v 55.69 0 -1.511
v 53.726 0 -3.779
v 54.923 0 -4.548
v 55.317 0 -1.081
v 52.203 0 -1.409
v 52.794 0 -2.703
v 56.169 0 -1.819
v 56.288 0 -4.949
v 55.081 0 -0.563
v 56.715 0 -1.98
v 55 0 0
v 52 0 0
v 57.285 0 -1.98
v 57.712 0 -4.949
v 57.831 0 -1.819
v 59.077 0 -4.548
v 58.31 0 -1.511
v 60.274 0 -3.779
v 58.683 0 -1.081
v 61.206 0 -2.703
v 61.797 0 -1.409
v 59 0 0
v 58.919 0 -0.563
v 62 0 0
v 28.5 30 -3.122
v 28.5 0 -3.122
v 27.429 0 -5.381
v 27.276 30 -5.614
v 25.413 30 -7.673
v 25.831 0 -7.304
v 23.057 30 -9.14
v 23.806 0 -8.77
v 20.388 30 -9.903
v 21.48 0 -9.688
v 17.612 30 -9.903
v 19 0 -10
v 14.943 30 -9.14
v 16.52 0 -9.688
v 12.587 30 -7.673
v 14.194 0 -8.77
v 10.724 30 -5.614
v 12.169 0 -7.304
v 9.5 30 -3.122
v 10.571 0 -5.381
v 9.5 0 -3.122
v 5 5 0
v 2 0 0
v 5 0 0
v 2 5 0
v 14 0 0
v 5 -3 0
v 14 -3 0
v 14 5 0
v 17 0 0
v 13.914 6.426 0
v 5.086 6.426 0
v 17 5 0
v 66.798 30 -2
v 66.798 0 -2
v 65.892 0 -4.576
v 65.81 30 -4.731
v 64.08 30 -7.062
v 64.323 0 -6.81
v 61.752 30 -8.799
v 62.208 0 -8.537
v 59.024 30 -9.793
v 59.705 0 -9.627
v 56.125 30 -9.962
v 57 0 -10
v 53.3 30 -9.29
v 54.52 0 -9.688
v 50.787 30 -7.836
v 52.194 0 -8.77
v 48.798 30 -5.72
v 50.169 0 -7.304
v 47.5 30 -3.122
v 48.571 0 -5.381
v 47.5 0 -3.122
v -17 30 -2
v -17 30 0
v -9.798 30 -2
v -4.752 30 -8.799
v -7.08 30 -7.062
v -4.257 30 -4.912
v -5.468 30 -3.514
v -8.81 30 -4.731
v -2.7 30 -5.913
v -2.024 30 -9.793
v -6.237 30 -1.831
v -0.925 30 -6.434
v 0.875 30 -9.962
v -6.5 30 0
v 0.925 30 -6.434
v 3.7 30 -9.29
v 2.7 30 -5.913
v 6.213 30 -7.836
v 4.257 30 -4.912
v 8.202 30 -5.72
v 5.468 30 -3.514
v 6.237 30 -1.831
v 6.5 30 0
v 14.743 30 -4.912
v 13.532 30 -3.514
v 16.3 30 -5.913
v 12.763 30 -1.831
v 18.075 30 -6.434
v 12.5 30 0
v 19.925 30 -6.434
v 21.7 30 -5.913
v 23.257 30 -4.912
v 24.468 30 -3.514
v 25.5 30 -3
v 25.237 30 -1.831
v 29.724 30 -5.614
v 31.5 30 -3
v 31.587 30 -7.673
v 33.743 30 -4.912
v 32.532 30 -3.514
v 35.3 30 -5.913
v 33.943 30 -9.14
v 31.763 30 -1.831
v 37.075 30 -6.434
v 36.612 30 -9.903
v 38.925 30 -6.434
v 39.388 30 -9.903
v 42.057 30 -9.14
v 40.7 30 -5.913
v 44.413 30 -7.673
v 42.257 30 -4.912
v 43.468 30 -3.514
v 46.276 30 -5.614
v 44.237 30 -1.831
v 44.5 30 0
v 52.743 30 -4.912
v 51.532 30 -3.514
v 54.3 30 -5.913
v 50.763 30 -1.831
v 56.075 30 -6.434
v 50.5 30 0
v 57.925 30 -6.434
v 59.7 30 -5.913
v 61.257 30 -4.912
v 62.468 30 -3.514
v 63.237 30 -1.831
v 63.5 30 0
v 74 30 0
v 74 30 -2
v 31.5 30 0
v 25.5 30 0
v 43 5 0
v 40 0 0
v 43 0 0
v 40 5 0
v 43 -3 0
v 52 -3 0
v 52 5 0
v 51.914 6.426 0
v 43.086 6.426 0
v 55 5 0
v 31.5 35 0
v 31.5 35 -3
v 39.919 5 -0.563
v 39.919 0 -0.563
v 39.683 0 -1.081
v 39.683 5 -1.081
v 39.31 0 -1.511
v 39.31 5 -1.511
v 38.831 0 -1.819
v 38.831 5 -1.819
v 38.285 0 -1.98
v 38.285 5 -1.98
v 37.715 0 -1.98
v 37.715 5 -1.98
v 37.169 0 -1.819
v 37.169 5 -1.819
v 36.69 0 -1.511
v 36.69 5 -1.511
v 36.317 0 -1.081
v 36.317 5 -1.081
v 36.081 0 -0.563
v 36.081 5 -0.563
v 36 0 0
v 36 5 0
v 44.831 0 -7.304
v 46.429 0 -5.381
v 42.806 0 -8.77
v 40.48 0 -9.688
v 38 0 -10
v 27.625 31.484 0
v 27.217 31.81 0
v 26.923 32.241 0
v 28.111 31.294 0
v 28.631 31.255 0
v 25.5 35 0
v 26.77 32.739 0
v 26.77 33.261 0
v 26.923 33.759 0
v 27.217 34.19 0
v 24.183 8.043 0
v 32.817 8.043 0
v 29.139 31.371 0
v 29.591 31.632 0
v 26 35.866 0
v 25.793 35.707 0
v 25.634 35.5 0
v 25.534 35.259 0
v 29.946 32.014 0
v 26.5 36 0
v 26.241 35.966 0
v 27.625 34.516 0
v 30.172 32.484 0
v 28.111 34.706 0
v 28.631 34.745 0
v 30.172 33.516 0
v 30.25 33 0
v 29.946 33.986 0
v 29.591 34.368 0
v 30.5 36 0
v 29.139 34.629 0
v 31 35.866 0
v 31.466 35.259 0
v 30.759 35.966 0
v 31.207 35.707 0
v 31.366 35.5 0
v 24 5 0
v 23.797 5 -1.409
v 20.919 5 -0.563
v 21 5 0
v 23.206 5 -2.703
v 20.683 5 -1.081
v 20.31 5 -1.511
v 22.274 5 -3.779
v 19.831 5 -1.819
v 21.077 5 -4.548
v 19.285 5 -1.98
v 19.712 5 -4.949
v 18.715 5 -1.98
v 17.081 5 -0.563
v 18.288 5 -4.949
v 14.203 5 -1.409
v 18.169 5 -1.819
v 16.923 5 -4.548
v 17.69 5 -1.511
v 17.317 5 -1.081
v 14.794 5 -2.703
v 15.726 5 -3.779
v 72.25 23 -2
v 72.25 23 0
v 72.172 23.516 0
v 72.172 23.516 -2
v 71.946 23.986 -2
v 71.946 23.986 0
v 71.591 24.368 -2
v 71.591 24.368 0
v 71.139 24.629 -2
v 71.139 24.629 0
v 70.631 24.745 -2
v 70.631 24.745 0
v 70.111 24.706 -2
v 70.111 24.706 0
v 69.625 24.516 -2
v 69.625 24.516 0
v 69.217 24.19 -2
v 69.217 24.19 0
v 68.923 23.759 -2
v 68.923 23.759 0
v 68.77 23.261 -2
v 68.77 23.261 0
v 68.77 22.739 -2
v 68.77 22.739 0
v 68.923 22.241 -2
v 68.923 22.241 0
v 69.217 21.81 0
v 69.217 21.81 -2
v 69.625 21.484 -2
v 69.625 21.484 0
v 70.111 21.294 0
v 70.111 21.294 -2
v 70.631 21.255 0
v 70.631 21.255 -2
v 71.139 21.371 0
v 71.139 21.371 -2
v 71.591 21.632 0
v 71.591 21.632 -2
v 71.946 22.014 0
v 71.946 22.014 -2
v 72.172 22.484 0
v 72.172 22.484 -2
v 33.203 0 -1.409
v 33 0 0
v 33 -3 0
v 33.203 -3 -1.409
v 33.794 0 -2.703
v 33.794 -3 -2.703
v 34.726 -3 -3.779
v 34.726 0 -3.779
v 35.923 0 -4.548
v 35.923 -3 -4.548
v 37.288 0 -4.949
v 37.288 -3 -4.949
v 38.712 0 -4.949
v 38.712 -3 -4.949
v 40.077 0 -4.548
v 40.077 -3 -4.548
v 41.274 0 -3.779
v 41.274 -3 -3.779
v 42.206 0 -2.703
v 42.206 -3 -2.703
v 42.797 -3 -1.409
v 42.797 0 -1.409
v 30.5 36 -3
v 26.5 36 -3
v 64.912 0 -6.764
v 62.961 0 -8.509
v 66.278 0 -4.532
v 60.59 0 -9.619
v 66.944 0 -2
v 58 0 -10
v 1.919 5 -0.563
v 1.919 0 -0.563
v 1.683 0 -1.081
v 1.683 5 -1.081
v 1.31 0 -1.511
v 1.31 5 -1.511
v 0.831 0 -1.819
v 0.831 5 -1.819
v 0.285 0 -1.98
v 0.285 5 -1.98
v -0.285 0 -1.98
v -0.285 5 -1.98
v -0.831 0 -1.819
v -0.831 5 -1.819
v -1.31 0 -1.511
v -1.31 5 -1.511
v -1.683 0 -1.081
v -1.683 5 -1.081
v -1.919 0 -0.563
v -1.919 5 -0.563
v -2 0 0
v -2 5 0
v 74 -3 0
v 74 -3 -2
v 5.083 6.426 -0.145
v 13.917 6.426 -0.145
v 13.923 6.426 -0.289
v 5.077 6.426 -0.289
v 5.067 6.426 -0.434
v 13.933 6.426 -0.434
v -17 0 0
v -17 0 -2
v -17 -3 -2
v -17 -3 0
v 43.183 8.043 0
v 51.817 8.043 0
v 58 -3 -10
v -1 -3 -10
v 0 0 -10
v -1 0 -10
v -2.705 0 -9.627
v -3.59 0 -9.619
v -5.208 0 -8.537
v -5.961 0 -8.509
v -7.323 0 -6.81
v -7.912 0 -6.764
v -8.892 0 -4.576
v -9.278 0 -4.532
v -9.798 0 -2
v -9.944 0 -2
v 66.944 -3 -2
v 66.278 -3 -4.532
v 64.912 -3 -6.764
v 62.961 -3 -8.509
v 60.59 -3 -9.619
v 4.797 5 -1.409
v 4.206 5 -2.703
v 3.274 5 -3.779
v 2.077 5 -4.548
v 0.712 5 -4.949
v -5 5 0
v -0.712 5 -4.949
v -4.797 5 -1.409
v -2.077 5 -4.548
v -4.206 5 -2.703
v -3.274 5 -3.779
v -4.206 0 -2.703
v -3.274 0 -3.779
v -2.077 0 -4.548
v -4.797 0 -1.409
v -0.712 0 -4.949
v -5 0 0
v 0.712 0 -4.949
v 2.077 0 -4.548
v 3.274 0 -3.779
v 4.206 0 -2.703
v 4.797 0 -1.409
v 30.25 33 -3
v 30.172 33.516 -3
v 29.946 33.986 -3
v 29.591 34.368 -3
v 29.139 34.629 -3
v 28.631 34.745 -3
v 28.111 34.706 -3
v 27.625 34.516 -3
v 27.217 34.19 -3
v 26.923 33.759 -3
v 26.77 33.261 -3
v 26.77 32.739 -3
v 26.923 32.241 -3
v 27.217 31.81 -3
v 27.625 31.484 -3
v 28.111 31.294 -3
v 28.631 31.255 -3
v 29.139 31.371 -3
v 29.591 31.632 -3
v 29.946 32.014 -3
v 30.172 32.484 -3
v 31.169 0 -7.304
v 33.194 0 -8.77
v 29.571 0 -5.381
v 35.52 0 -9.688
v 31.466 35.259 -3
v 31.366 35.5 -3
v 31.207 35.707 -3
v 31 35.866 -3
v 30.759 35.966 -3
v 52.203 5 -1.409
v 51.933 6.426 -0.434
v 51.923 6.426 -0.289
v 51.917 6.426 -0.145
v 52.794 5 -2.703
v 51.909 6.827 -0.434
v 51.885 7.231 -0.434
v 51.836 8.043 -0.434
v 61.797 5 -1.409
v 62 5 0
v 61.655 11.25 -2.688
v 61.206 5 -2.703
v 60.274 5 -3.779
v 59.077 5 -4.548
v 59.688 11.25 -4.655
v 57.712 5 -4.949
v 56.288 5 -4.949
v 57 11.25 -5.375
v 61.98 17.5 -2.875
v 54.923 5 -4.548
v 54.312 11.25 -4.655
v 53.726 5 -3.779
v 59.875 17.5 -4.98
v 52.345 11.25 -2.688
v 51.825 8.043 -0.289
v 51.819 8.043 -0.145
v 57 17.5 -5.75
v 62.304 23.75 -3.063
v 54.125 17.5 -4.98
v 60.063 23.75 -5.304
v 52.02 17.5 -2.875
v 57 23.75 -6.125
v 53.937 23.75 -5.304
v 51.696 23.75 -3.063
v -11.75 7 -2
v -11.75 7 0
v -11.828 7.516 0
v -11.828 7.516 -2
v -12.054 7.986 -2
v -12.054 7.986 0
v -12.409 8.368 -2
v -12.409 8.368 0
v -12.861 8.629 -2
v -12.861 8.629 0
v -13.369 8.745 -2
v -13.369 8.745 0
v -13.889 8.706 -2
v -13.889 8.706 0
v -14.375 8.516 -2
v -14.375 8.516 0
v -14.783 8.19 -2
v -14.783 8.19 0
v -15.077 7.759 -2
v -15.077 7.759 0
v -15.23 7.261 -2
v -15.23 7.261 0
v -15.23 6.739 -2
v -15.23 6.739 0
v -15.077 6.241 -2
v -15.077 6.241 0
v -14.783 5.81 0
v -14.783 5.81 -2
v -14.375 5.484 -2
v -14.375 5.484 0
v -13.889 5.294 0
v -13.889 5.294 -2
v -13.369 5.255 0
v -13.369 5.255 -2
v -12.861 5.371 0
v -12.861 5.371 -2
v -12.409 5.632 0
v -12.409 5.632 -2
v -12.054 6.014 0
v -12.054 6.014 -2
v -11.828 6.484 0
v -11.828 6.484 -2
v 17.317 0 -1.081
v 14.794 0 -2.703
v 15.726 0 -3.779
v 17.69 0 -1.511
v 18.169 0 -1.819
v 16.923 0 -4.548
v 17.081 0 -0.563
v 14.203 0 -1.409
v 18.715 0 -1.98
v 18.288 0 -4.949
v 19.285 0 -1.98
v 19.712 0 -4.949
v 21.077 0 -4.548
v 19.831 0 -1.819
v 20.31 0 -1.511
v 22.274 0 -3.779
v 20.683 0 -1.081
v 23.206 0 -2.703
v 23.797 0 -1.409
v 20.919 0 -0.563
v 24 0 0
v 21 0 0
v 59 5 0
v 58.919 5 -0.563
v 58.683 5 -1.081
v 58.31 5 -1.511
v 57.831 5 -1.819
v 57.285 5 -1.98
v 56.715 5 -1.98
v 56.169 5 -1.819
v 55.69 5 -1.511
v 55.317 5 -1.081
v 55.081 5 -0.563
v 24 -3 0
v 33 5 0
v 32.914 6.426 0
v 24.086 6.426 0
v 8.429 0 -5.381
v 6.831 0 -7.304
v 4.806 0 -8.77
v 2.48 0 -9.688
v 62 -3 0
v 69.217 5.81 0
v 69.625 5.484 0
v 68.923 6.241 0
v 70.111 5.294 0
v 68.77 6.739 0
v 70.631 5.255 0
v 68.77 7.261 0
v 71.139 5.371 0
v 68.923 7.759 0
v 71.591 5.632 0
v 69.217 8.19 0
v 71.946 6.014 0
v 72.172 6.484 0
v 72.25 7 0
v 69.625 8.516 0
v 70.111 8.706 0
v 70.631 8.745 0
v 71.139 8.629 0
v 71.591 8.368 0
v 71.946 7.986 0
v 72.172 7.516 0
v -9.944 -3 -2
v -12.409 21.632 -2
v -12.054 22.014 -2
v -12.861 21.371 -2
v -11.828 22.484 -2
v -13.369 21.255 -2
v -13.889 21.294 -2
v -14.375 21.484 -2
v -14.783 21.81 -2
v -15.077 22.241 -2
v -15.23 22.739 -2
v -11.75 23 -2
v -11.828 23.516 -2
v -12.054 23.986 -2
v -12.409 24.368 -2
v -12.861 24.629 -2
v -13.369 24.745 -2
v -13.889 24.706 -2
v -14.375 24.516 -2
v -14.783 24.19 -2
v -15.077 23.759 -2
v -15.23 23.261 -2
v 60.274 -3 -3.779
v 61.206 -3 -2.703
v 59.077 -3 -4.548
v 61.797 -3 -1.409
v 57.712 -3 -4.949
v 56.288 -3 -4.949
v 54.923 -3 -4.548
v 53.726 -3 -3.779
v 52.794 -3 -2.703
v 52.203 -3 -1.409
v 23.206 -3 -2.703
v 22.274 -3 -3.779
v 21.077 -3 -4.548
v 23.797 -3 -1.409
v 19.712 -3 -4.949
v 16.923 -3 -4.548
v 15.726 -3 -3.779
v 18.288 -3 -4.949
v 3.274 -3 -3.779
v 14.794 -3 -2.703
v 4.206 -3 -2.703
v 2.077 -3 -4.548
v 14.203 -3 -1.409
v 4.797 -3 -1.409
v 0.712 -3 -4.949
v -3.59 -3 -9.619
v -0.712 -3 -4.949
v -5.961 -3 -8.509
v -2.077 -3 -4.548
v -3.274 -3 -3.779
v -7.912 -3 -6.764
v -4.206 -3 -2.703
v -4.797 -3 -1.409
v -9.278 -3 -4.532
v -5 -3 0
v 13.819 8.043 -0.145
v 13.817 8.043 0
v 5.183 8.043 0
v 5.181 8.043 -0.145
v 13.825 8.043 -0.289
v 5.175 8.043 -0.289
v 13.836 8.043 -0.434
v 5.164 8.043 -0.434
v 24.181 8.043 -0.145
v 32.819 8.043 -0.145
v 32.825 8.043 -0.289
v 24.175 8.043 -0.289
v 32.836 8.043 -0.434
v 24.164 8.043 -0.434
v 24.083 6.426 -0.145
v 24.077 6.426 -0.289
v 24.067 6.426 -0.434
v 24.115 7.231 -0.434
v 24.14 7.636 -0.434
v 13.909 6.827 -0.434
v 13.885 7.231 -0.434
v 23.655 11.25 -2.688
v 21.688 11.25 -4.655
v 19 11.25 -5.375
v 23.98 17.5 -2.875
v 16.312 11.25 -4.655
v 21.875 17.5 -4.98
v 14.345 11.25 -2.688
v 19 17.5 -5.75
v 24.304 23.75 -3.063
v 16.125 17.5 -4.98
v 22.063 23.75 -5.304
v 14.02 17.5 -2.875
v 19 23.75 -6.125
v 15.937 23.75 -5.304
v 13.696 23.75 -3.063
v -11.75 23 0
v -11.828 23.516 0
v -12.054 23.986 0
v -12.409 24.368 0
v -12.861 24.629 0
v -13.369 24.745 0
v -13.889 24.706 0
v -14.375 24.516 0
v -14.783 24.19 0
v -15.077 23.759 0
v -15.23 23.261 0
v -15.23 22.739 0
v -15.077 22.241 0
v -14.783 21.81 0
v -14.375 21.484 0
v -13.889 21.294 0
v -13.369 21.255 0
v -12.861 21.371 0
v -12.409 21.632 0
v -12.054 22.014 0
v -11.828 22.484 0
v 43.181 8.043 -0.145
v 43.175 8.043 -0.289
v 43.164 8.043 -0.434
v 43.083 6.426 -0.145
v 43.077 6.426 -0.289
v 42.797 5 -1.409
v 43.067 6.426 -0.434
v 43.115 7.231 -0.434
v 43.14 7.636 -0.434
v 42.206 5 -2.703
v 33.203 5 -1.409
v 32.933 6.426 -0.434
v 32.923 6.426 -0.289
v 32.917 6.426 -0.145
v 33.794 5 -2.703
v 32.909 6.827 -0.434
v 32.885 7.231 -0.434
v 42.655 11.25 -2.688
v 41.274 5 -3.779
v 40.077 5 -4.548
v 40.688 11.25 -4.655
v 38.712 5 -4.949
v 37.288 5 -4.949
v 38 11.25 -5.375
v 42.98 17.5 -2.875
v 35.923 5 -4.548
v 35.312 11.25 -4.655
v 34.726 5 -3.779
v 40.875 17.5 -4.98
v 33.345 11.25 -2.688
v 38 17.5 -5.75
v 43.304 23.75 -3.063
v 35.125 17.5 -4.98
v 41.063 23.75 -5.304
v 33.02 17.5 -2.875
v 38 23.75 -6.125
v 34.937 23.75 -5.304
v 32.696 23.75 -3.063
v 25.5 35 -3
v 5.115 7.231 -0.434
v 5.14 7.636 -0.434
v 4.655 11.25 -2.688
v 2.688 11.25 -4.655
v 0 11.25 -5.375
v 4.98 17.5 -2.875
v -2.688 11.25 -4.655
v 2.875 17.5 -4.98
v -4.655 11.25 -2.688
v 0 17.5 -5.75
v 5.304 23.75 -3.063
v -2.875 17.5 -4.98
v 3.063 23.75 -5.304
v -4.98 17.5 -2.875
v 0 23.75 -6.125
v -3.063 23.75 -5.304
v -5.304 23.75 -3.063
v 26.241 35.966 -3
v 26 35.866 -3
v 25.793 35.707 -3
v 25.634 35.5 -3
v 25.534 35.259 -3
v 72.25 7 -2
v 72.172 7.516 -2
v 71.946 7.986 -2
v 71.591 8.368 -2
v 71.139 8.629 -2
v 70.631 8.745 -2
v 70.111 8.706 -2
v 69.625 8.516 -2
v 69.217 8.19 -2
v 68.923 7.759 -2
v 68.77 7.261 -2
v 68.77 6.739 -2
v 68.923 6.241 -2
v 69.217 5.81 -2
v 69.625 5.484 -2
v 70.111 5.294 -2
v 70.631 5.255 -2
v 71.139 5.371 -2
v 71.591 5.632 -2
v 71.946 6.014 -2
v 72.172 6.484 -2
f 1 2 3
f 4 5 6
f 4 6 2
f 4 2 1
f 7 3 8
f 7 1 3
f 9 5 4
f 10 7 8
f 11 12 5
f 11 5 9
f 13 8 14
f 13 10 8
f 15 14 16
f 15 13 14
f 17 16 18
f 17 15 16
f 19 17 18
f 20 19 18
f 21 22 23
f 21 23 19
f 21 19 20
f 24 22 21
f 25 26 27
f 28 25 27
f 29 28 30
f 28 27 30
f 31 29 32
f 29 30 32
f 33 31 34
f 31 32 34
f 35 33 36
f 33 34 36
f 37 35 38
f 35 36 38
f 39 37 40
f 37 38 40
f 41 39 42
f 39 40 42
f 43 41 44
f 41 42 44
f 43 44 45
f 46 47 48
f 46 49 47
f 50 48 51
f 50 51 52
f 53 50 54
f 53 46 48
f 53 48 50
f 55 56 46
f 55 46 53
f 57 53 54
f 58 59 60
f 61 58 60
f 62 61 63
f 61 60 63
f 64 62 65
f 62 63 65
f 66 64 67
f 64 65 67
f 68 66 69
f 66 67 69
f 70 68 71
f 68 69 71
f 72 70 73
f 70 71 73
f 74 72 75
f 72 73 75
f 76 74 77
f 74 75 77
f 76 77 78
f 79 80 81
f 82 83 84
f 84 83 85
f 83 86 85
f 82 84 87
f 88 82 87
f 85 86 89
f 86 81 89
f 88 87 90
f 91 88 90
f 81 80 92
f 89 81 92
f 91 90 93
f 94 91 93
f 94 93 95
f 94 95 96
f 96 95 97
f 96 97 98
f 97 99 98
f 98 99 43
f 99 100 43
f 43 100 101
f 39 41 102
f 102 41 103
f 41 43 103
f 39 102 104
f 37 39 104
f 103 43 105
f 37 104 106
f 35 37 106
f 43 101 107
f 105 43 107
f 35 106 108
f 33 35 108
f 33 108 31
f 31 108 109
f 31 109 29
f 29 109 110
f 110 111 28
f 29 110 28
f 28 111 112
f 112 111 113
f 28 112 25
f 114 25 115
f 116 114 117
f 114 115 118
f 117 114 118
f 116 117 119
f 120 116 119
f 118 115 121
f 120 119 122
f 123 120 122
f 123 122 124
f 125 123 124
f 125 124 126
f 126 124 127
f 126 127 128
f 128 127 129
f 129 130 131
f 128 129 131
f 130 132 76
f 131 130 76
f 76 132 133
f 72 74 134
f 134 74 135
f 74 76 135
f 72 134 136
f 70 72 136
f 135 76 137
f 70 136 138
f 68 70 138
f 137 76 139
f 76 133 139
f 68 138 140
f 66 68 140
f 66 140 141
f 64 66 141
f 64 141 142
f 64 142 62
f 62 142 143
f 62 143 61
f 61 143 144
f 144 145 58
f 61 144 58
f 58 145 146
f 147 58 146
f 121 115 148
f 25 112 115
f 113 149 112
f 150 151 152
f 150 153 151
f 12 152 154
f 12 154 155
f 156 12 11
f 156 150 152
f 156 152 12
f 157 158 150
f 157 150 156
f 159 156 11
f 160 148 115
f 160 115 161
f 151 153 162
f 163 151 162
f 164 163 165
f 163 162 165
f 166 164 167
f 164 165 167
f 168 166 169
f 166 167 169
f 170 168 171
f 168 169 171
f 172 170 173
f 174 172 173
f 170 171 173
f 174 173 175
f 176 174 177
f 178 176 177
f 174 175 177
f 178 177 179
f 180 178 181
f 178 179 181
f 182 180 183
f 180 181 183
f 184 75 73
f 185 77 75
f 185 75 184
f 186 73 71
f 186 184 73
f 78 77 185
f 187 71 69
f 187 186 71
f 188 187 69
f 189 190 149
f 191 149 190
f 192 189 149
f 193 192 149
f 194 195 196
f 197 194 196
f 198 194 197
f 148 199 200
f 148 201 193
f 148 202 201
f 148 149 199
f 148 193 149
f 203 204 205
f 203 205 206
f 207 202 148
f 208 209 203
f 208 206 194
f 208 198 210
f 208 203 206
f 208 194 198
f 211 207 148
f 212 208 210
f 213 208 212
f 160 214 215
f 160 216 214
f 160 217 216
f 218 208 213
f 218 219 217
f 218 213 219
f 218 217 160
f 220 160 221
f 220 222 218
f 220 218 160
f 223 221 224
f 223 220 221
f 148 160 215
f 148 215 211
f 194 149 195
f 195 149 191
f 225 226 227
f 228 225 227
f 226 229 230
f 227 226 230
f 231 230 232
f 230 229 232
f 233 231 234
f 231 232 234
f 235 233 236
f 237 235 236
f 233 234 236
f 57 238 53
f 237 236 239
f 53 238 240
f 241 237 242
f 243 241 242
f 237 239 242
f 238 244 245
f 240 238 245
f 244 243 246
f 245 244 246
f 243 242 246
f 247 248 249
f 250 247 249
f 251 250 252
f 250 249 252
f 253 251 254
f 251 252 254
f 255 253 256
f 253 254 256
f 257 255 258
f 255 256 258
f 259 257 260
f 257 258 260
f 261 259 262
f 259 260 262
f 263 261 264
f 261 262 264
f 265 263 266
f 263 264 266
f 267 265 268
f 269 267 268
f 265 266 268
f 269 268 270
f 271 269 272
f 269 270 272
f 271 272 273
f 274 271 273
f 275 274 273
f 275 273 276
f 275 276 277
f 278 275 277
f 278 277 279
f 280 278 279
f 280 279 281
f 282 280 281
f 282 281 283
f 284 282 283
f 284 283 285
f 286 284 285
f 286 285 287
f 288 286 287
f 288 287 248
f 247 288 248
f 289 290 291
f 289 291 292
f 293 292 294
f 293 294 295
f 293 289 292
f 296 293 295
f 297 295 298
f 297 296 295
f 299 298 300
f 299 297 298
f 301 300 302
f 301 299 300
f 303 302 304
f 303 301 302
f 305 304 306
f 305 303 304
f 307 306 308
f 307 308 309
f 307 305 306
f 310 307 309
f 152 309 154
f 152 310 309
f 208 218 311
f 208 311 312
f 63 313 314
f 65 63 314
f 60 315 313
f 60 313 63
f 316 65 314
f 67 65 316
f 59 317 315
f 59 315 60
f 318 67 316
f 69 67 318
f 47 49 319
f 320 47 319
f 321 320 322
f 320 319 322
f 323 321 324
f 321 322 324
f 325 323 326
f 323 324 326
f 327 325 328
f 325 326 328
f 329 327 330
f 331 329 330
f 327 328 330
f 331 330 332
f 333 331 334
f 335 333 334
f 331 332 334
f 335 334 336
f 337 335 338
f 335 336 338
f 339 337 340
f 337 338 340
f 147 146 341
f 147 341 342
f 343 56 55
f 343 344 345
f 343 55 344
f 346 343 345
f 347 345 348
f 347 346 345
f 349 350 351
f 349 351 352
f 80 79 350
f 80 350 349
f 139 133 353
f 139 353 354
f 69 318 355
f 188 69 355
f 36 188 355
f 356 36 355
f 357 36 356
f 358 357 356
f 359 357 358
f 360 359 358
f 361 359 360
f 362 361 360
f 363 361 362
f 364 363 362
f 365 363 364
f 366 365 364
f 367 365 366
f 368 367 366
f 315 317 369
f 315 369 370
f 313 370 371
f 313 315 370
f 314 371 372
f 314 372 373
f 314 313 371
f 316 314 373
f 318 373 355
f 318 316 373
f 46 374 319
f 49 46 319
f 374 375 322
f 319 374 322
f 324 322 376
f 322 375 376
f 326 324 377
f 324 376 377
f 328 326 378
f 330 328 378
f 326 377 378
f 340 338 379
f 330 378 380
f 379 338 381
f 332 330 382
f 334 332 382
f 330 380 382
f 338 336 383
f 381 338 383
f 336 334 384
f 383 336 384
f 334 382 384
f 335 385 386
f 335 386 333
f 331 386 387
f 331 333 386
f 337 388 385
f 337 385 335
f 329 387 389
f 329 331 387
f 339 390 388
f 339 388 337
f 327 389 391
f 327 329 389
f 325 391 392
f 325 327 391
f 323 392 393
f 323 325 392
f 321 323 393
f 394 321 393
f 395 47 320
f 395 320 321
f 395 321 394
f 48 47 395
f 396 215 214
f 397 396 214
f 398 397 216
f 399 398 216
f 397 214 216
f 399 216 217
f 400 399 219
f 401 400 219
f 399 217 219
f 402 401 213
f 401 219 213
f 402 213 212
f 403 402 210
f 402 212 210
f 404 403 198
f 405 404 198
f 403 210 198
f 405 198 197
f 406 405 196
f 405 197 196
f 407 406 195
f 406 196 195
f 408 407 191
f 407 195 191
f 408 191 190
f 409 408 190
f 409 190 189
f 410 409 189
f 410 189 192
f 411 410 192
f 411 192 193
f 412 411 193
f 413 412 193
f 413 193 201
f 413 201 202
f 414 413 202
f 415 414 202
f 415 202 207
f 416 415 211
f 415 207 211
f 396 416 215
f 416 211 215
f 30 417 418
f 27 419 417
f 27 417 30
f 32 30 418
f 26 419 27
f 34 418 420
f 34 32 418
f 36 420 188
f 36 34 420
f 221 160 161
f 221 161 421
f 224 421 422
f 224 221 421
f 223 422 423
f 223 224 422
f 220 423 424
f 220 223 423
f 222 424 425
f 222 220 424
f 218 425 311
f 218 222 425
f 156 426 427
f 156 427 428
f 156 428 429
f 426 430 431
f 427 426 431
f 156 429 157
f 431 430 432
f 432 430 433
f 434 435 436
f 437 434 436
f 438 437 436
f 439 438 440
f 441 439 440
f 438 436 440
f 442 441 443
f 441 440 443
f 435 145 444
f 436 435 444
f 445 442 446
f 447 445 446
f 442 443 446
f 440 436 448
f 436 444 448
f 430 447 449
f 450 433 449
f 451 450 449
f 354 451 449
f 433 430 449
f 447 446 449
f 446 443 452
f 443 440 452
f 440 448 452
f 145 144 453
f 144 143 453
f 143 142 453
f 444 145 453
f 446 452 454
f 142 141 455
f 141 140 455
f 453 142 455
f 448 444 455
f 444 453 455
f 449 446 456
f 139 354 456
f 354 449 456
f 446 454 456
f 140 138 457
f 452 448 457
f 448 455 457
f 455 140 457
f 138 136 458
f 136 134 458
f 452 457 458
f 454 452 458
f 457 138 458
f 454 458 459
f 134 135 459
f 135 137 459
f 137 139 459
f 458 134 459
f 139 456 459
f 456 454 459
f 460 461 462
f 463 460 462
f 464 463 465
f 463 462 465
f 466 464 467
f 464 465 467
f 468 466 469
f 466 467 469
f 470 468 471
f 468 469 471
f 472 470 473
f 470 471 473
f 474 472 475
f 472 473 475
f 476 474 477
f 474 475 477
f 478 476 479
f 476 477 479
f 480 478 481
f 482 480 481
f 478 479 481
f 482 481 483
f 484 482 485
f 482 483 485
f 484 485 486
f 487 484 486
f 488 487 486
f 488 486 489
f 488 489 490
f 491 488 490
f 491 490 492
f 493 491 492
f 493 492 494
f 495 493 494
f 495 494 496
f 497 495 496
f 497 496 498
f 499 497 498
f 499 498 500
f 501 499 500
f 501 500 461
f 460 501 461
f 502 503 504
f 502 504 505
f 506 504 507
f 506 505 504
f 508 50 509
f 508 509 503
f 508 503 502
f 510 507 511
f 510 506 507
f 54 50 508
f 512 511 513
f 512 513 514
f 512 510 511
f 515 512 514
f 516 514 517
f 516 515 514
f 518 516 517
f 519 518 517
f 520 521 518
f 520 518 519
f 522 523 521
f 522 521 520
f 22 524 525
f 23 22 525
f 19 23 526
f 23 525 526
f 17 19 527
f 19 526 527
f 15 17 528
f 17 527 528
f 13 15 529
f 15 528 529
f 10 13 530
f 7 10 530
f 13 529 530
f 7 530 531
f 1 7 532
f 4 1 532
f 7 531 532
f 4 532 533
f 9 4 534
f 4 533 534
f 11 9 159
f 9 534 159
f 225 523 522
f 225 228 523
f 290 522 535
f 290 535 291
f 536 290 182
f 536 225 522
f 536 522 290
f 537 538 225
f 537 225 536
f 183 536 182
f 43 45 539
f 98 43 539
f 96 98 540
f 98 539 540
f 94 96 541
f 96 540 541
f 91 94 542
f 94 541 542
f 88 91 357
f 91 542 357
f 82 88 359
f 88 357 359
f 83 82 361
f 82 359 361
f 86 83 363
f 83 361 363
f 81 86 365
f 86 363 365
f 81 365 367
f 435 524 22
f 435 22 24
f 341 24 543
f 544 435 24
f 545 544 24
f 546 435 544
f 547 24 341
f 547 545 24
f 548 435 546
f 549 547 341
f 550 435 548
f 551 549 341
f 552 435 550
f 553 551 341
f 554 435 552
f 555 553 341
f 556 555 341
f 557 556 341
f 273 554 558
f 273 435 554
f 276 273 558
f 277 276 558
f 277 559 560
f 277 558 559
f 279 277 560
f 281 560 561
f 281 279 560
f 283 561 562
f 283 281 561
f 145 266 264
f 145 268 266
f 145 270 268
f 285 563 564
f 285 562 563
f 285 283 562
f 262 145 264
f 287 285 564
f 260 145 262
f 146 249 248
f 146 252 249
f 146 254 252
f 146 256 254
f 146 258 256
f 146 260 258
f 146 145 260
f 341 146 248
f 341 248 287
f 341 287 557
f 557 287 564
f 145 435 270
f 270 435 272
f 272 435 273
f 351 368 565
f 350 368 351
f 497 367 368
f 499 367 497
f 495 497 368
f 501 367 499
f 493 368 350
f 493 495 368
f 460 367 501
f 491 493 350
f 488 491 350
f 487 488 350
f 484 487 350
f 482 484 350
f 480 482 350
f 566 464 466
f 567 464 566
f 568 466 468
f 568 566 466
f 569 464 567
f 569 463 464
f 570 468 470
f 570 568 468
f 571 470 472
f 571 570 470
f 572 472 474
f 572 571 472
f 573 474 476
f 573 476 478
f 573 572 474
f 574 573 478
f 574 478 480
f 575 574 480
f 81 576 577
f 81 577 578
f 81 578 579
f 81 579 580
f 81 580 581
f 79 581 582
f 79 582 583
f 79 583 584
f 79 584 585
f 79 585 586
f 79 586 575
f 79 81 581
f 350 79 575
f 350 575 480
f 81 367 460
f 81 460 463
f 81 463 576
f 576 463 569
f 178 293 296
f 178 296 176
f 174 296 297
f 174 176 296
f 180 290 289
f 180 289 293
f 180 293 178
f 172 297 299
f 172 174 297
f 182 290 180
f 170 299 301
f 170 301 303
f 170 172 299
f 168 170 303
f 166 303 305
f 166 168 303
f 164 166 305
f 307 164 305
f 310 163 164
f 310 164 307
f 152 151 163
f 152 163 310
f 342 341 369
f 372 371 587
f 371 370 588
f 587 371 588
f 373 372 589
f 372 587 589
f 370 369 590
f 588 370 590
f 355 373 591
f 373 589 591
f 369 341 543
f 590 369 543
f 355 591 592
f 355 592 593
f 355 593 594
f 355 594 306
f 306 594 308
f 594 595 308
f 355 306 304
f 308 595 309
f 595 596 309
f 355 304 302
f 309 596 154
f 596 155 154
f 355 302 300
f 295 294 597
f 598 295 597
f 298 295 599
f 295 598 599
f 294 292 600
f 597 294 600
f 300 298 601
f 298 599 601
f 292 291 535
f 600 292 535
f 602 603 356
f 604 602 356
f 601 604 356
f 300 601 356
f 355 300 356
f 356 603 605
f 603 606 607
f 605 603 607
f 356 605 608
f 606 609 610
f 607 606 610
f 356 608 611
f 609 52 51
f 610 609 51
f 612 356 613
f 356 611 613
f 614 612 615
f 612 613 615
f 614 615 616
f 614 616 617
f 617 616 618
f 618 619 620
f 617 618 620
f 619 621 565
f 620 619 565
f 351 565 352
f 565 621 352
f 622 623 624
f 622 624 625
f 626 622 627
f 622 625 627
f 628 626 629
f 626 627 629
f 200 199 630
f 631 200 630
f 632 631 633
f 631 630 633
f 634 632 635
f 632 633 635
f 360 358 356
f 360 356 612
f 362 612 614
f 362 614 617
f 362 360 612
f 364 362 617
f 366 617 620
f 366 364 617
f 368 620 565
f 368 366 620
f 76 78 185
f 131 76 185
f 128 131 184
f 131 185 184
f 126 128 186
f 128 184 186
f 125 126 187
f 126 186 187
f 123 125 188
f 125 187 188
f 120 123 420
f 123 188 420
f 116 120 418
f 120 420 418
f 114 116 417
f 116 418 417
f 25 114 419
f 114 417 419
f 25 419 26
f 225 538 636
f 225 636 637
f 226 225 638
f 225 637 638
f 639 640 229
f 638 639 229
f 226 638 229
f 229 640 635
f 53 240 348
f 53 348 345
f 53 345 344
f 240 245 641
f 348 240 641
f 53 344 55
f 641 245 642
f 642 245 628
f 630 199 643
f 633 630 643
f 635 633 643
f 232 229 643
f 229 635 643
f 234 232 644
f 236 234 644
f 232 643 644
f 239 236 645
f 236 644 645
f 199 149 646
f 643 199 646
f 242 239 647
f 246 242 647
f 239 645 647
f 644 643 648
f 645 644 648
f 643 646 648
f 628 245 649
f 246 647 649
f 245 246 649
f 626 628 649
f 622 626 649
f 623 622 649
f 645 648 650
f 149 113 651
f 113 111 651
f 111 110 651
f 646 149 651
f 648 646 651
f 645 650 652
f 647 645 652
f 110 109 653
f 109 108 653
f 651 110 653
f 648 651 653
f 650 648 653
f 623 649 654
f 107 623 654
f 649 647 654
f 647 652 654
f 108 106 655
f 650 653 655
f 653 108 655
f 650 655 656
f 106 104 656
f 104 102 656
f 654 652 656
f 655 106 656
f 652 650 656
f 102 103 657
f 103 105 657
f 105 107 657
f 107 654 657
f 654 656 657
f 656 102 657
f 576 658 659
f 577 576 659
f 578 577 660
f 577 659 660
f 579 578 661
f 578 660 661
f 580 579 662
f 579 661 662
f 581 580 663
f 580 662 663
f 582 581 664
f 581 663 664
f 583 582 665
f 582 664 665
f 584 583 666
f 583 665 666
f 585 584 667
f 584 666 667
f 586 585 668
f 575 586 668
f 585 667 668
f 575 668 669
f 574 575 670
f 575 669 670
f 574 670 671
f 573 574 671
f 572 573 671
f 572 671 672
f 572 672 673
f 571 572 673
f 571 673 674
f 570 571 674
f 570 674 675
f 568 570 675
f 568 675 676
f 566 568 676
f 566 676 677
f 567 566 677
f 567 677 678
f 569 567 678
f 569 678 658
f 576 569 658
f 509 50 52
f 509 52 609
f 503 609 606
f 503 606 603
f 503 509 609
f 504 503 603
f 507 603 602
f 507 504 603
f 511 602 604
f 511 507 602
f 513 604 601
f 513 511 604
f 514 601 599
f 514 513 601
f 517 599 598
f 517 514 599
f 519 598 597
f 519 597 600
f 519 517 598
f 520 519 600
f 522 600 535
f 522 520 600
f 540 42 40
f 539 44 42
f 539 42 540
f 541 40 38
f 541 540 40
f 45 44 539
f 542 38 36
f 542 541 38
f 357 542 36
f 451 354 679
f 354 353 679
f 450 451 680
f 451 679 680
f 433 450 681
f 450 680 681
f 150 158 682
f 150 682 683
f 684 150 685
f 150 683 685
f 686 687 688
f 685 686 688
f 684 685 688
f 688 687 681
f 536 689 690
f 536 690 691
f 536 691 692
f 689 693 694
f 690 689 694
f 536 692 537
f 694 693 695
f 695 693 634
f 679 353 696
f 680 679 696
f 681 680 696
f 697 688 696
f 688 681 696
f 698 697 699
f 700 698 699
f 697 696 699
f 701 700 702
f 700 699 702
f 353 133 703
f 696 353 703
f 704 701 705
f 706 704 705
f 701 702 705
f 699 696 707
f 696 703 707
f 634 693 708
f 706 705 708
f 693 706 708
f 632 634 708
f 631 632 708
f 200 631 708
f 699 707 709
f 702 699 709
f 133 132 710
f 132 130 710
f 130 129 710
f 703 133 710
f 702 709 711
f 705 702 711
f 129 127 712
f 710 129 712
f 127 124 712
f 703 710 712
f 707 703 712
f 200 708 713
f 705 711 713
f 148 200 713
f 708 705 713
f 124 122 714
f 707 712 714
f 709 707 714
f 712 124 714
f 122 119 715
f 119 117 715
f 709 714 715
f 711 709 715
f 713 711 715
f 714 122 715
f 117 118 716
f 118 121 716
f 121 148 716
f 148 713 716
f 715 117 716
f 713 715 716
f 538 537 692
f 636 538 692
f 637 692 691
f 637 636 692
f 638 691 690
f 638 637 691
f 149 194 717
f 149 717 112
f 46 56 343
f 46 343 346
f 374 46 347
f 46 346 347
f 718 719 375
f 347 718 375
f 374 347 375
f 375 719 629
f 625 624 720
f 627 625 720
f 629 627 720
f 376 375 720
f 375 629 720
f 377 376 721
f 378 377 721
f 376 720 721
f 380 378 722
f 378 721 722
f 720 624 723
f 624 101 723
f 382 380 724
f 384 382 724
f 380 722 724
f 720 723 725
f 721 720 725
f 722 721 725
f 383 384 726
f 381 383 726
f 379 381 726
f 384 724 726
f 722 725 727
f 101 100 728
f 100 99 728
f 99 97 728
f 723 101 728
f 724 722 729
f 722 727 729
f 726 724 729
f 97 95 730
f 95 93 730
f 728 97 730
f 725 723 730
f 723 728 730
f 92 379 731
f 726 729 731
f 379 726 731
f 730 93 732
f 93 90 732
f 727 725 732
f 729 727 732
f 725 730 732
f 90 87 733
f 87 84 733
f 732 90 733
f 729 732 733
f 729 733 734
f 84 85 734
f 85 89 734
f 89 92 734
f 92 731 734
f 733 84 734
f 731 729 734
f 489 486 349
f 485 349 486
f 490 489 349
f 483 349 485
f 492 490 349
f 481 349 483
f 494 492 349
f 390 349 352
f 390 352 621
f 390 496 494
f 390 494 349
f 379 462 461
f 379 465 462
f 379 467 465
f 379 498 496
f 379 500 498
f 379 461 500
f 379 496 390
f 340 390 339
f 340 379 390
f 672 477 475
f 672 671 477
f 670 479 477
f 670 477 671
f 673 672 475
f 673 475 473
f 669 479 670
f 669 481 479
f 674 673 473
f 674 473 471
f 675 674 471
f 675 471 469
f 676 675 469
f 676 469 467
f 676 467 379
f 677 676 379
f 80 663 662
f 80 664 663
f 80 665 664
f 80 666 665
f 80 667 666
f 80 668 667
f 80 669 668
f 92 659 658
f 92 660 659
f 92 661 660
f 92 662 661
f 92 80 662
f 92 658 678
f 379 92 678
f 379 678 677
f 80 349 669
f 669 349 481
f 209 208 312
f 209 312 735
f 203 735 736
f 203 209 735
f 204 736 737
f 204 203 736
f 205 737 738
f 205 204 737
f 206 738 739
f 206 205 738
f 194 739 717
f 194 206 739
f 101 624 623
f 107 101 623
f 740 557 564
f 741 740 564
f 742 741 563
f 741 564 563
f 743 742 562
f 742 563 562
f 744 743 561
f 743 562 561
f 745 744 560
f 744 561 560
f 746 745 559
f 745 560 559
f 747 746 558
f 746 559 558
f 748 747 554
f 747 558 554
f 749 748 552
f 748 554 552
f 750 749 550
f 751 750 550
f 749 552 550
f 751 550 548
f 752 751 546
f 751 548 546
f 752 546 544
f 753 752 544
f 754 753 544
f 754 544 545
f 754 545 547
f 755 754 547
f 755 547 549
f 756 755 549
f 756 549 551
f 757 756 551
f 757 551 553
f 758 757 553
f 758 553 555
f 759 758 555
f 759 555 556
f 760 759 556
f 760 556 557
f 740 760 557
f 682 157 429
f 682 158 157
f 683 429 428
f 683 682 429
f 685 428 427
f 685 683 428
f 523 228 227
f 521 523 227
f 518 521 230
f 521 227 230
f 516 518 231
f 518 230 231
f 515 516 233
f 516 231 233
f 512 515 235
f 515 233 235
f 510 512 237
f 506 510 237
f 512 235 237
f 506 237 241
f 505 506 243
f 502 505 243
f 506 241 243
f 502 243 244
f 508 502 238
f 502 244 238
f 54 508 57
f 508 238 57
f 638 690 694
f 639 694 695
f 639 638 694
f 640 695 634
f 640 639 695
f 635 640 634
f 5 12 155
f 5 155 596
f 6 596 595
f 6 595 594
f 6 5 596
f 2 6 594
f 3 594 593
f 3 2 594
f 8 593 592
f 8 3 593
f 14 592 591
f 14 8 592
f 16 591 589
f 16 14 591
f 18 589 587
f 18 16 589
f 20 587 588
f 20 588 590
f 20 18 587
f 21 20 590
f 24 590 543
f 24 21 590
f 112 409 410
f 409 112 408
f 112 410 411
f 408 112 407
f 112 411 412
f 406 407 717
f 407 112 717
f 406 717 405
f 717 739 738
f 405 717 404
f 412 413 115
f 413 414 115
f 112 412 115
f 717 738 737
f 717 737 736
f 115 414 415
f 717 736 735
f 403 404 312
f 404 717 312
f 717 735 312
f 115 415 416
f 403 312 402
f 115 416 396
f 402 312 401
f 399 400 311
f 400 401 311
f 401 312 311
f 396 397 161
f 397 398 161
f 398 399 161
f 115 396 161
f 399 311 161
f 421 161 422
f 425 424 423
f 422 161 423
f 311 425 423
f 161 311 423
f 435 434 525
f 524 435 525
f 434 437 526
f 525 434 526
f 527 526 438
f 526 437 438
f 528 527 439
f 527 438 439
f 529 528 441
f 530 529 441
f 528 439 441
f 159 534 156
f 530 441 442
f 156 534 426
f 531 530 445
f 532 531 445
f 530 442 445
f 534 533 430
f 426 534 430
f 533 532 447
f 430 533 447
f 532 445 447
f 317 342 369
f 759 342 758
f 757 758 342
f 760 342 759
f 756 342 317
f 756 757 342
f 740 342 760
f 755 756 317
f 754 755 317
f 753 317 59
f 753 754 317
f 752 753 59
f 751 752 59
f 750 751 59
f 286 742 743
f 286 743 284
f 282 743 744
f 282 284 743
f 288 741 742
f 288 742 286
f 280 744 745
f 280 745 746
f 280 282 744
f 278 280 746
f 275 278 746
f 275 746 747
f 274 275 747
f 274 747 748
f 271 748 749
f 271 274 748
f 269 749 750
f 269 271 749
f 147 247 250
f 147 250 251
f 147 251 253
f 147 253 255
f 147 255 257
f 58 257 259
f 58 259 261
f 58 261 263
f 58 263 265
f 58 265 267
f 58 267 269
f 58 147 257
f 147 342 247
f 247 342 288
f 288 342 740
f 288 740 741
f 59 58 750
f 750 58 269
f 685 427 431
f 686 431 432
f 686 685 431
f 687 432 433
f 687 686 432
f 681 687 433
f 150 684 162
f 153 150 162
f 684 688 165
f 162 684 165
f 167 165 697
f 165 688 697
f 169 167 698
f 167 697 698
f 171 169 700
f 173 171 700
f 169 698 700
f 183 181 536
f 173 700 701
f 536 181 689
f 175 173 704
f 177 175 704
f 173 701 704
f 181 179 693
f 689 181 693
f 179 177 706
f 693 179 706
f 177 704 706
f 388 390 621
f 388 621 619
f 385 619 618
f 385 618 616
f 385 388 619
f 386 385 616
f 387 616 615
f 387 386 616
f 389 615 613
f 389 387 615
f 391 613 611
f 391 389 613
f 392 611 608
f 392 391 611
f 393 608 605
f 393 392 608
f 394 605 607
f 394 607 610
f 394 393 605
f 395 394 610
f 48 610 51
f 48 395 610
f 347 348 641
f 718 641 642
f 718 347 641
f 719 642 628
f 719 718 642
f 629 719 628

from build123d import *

# Parameters (mm, degrees)
BOSS_EXTRUDE1_DEPTH   = 30
SKETCH4_R             = 2
CUT_EXTRUDE1_DEPTH    = 10
LPATTERN9_COUNT       = 4
LPATTERN9_PITCH       = 19
SKETCH5_W             = 9.377010815
SKETCH5_H             = 30
BOSS_EXTRUDE2_DEPTH   = 2
SKETCH5_W_2           = 8.706514496
BOSS_EXTRUDE2_2_DEPTH = 2
SKETCH6_R             = 1.75
CUT_EXTRUDE2_DEPTH    = 81.473598155
BOSS_EXTRUDE4_DEPTH   = 3
SKETCH10_W            = 1.262251727
SKETCH10_H            = 1.617260026
CUT_EXTRUDE3_DEPTH    = 55
SKETCH11_R            = 1.75
BOSS_EXTRUDE5_DEPTH   = 3


# Read off the part's stored shape, not the designer's step: Boundary-Cut1
with BuildPart() as part:
    # Sketch1 → Boss-Extrude1 (new body)
    with BuildSketch(Plane(origin=(0, 0, 0), x_dir=(1, 0, 0), z_dir=(0, 1, 0))):
        with BuildLine():
            Line((-10, 0), (10, 0))
            ThreePointArc((10, 0), (0, 10), (-10, 0))
        make_face()
    boss_extrude1 = extrude(amount=BOSS_EXTRUDE1_DEPTH)

    # Boundary-Cut1 outline → Boundary-Cut1 (revolve, cut)
    with BuildSketch(Plane.XY):
        Polygon((0, 30.000006646), (0, 5), (5, 5), (6.500000399, 30.000006646), align=None)
    boundary_cut1 = revolve(axis=Axis((0, 0, 0), (0, 1, 0)), mode=Mode.SUBTRACT)

    # Sketch4 → Cut-Extrude1 (cut)
    with BuildSketch(Plane(origin=(0, 5, 0), x_dir=(1, 0, 0), z_dir=(0, 1, 0))):
        Circle(SKETCH4_R)
    cut_extrude1 = extrude(amount=-CUT_EXTRUDE1_DEPTH, mode=Mode.SUBTRACT)

    # LPattern9: Boss-Extrude1, Boundary-Cut1, Cut-Extrude1 ×4
    with Locations(*[(i * LPATTERN9_PITCH, 0, 0) for i in range(1, LPATTERN9_COUNT)]):
        add(boss_extrude1)
        add(boundary_cut1, mode=Mode.SUBTRACT)
        add(cut_extrude1, mode=Mode.SUBTRACT)



with BuildPart() as body_2:
    # Sketch5 → Boss-Extrude2 (new body)
    with BuildSketch(Plane.XY):
        with Locations((-12.311494593, 15)):
            Rectangle(SKETCH5_W, SKETCH5_H)
    extrude(amount=-BOSS_EXTRUDE2_DEPTH)


with BuildPart() as body_3:
    # Sketch5 → Boss-Extrude2 2 (new body)
    with BuildSketch(Plane.XY):
        with Locations((69.646742752, 15)):
            Rectangle(SKETCH5_W_2, SKETCH5_H)
    extrude(amount=-BOSS_EXTRUDE2_2_DEPTH)


with BuildPart() as cut_extrude2_tool:
    # Sketch6 → Cut-Extrude2 (new, through all)
    with BuildSketch(Plane.XY):
        with Locations((-13.5, 23)):
            Circle(SKETCH6_R)
        with Locations((-13.5, 7)):
            Circle(SKETCH6_R)
        with Locations((70.5, 23)):
            Circle(SKETCH6_R)
        with Locations((70.5, 7)):
            Circle(SKETCH6_R)
    extrude(amount=-CUT_EXTRUDE2_DEPTH)


with BuildPart() as body_2_1:
    add(body_2.part)

    # Cut-Extrude2: cut by cut_extrude2_tool
    add(cut_extrude2_tool.part, mode=Mode.SUBTRACT)


with BuildPart() as body_3_1:
    add(body_3.part)

    # Cut-Extrude2: cut by cut_extrude2_tool
    add(cut_extrude2_tool.part, mode=Mode.SUBTRACT)


with BuildPart() as part_1:
    add(part.part)

    add(body_2_1.part)  # Boss-Extrude4 merges body 2

    add(body_3_1.part)  # Boss-Extrude4 merges body 3
    # Sketch9 → Boss-Extrude4 (add)
    with BuildSketch(Plane.XZ):
        with BuildLine():
            Line((5, 0), (14, 0))
            ThreePointArc((14, 0), (19, -5), (24, 0))
            Line((24, 0), (33, 0))
            ThreePointArc((33, 0), (38, -5), (43, 0))
            Line((43, 0), (52, 0))
            ThreePointArc((52, 0), (57, -5), (62, 0))
            Line((62, 0), (67, 0))
            Line((67, 0), (74, 0))
            Line((74, 0), (74, -2))
            Line((74, -2), (66.94427191, -2))
            ThreePointArc((66.94427191, -2), (64, -7.708203932), (58, -10))
            Line((58, -10), (-1, -10))
            ThreePointArc((-1, -10), (-7, -7.708203932), (-9.94427191, -2))
            Line((-9.94427191, -2), (-17, -2))
            Line((-17, -2), (-17, 0))
            Line((-17, 0), (-10, 0))
            Line((-10, 0), (-5, 0))
            ThreePointArc((-5, 0), (0, -5), (5, 0))
        make_face()
    extrude(amount=BOSS_EXTRUDE4_DEPTH)

    # Sketch10 → Cut-Extrude3 (cut)
    with BuildSketch(Plane(origin=(0, 0, 0), x_dir=(0, 0, -1), z_dir=(1, 0, 0))):
        with Locations((-0.197226833, 7.234540745)):
            Rectangle(SKETCH10_W, SKETCH10_H)
    extrude(amount=CUT_EXTRUDE3_DEPTH, mode=Mode.SUBTRACT)

    # Sketch11 → Boss-Extrude5 (add)
    with BuildSketch(Plane.XY):
        with BuildLine():
            Line((25.500111158, 30), (31.499888841, 30))
            Line((31.499888841, 30), (31.499888841, 35))
            ThreePointArc((31.499888841, 35), (31.206995622, 35.707106781), (30.499888841, 36))
            Line((30.499888841, 36), (26.500111158, 36))
            ThreePointArc((26.500111158, 36), (25.793004377, 35.707106781), (25.500111158, 35))
            Line((25.500111158, 35), (25.500111158, 30))
        make_face()
        with Locations((28.5, 33)):
            Circle(SKETCH11_R, mode=Mode.SUBTRACT)
    extrude(amount=-BOSS_EXTRUDE5_DEPTH)


solid = part_1.part
